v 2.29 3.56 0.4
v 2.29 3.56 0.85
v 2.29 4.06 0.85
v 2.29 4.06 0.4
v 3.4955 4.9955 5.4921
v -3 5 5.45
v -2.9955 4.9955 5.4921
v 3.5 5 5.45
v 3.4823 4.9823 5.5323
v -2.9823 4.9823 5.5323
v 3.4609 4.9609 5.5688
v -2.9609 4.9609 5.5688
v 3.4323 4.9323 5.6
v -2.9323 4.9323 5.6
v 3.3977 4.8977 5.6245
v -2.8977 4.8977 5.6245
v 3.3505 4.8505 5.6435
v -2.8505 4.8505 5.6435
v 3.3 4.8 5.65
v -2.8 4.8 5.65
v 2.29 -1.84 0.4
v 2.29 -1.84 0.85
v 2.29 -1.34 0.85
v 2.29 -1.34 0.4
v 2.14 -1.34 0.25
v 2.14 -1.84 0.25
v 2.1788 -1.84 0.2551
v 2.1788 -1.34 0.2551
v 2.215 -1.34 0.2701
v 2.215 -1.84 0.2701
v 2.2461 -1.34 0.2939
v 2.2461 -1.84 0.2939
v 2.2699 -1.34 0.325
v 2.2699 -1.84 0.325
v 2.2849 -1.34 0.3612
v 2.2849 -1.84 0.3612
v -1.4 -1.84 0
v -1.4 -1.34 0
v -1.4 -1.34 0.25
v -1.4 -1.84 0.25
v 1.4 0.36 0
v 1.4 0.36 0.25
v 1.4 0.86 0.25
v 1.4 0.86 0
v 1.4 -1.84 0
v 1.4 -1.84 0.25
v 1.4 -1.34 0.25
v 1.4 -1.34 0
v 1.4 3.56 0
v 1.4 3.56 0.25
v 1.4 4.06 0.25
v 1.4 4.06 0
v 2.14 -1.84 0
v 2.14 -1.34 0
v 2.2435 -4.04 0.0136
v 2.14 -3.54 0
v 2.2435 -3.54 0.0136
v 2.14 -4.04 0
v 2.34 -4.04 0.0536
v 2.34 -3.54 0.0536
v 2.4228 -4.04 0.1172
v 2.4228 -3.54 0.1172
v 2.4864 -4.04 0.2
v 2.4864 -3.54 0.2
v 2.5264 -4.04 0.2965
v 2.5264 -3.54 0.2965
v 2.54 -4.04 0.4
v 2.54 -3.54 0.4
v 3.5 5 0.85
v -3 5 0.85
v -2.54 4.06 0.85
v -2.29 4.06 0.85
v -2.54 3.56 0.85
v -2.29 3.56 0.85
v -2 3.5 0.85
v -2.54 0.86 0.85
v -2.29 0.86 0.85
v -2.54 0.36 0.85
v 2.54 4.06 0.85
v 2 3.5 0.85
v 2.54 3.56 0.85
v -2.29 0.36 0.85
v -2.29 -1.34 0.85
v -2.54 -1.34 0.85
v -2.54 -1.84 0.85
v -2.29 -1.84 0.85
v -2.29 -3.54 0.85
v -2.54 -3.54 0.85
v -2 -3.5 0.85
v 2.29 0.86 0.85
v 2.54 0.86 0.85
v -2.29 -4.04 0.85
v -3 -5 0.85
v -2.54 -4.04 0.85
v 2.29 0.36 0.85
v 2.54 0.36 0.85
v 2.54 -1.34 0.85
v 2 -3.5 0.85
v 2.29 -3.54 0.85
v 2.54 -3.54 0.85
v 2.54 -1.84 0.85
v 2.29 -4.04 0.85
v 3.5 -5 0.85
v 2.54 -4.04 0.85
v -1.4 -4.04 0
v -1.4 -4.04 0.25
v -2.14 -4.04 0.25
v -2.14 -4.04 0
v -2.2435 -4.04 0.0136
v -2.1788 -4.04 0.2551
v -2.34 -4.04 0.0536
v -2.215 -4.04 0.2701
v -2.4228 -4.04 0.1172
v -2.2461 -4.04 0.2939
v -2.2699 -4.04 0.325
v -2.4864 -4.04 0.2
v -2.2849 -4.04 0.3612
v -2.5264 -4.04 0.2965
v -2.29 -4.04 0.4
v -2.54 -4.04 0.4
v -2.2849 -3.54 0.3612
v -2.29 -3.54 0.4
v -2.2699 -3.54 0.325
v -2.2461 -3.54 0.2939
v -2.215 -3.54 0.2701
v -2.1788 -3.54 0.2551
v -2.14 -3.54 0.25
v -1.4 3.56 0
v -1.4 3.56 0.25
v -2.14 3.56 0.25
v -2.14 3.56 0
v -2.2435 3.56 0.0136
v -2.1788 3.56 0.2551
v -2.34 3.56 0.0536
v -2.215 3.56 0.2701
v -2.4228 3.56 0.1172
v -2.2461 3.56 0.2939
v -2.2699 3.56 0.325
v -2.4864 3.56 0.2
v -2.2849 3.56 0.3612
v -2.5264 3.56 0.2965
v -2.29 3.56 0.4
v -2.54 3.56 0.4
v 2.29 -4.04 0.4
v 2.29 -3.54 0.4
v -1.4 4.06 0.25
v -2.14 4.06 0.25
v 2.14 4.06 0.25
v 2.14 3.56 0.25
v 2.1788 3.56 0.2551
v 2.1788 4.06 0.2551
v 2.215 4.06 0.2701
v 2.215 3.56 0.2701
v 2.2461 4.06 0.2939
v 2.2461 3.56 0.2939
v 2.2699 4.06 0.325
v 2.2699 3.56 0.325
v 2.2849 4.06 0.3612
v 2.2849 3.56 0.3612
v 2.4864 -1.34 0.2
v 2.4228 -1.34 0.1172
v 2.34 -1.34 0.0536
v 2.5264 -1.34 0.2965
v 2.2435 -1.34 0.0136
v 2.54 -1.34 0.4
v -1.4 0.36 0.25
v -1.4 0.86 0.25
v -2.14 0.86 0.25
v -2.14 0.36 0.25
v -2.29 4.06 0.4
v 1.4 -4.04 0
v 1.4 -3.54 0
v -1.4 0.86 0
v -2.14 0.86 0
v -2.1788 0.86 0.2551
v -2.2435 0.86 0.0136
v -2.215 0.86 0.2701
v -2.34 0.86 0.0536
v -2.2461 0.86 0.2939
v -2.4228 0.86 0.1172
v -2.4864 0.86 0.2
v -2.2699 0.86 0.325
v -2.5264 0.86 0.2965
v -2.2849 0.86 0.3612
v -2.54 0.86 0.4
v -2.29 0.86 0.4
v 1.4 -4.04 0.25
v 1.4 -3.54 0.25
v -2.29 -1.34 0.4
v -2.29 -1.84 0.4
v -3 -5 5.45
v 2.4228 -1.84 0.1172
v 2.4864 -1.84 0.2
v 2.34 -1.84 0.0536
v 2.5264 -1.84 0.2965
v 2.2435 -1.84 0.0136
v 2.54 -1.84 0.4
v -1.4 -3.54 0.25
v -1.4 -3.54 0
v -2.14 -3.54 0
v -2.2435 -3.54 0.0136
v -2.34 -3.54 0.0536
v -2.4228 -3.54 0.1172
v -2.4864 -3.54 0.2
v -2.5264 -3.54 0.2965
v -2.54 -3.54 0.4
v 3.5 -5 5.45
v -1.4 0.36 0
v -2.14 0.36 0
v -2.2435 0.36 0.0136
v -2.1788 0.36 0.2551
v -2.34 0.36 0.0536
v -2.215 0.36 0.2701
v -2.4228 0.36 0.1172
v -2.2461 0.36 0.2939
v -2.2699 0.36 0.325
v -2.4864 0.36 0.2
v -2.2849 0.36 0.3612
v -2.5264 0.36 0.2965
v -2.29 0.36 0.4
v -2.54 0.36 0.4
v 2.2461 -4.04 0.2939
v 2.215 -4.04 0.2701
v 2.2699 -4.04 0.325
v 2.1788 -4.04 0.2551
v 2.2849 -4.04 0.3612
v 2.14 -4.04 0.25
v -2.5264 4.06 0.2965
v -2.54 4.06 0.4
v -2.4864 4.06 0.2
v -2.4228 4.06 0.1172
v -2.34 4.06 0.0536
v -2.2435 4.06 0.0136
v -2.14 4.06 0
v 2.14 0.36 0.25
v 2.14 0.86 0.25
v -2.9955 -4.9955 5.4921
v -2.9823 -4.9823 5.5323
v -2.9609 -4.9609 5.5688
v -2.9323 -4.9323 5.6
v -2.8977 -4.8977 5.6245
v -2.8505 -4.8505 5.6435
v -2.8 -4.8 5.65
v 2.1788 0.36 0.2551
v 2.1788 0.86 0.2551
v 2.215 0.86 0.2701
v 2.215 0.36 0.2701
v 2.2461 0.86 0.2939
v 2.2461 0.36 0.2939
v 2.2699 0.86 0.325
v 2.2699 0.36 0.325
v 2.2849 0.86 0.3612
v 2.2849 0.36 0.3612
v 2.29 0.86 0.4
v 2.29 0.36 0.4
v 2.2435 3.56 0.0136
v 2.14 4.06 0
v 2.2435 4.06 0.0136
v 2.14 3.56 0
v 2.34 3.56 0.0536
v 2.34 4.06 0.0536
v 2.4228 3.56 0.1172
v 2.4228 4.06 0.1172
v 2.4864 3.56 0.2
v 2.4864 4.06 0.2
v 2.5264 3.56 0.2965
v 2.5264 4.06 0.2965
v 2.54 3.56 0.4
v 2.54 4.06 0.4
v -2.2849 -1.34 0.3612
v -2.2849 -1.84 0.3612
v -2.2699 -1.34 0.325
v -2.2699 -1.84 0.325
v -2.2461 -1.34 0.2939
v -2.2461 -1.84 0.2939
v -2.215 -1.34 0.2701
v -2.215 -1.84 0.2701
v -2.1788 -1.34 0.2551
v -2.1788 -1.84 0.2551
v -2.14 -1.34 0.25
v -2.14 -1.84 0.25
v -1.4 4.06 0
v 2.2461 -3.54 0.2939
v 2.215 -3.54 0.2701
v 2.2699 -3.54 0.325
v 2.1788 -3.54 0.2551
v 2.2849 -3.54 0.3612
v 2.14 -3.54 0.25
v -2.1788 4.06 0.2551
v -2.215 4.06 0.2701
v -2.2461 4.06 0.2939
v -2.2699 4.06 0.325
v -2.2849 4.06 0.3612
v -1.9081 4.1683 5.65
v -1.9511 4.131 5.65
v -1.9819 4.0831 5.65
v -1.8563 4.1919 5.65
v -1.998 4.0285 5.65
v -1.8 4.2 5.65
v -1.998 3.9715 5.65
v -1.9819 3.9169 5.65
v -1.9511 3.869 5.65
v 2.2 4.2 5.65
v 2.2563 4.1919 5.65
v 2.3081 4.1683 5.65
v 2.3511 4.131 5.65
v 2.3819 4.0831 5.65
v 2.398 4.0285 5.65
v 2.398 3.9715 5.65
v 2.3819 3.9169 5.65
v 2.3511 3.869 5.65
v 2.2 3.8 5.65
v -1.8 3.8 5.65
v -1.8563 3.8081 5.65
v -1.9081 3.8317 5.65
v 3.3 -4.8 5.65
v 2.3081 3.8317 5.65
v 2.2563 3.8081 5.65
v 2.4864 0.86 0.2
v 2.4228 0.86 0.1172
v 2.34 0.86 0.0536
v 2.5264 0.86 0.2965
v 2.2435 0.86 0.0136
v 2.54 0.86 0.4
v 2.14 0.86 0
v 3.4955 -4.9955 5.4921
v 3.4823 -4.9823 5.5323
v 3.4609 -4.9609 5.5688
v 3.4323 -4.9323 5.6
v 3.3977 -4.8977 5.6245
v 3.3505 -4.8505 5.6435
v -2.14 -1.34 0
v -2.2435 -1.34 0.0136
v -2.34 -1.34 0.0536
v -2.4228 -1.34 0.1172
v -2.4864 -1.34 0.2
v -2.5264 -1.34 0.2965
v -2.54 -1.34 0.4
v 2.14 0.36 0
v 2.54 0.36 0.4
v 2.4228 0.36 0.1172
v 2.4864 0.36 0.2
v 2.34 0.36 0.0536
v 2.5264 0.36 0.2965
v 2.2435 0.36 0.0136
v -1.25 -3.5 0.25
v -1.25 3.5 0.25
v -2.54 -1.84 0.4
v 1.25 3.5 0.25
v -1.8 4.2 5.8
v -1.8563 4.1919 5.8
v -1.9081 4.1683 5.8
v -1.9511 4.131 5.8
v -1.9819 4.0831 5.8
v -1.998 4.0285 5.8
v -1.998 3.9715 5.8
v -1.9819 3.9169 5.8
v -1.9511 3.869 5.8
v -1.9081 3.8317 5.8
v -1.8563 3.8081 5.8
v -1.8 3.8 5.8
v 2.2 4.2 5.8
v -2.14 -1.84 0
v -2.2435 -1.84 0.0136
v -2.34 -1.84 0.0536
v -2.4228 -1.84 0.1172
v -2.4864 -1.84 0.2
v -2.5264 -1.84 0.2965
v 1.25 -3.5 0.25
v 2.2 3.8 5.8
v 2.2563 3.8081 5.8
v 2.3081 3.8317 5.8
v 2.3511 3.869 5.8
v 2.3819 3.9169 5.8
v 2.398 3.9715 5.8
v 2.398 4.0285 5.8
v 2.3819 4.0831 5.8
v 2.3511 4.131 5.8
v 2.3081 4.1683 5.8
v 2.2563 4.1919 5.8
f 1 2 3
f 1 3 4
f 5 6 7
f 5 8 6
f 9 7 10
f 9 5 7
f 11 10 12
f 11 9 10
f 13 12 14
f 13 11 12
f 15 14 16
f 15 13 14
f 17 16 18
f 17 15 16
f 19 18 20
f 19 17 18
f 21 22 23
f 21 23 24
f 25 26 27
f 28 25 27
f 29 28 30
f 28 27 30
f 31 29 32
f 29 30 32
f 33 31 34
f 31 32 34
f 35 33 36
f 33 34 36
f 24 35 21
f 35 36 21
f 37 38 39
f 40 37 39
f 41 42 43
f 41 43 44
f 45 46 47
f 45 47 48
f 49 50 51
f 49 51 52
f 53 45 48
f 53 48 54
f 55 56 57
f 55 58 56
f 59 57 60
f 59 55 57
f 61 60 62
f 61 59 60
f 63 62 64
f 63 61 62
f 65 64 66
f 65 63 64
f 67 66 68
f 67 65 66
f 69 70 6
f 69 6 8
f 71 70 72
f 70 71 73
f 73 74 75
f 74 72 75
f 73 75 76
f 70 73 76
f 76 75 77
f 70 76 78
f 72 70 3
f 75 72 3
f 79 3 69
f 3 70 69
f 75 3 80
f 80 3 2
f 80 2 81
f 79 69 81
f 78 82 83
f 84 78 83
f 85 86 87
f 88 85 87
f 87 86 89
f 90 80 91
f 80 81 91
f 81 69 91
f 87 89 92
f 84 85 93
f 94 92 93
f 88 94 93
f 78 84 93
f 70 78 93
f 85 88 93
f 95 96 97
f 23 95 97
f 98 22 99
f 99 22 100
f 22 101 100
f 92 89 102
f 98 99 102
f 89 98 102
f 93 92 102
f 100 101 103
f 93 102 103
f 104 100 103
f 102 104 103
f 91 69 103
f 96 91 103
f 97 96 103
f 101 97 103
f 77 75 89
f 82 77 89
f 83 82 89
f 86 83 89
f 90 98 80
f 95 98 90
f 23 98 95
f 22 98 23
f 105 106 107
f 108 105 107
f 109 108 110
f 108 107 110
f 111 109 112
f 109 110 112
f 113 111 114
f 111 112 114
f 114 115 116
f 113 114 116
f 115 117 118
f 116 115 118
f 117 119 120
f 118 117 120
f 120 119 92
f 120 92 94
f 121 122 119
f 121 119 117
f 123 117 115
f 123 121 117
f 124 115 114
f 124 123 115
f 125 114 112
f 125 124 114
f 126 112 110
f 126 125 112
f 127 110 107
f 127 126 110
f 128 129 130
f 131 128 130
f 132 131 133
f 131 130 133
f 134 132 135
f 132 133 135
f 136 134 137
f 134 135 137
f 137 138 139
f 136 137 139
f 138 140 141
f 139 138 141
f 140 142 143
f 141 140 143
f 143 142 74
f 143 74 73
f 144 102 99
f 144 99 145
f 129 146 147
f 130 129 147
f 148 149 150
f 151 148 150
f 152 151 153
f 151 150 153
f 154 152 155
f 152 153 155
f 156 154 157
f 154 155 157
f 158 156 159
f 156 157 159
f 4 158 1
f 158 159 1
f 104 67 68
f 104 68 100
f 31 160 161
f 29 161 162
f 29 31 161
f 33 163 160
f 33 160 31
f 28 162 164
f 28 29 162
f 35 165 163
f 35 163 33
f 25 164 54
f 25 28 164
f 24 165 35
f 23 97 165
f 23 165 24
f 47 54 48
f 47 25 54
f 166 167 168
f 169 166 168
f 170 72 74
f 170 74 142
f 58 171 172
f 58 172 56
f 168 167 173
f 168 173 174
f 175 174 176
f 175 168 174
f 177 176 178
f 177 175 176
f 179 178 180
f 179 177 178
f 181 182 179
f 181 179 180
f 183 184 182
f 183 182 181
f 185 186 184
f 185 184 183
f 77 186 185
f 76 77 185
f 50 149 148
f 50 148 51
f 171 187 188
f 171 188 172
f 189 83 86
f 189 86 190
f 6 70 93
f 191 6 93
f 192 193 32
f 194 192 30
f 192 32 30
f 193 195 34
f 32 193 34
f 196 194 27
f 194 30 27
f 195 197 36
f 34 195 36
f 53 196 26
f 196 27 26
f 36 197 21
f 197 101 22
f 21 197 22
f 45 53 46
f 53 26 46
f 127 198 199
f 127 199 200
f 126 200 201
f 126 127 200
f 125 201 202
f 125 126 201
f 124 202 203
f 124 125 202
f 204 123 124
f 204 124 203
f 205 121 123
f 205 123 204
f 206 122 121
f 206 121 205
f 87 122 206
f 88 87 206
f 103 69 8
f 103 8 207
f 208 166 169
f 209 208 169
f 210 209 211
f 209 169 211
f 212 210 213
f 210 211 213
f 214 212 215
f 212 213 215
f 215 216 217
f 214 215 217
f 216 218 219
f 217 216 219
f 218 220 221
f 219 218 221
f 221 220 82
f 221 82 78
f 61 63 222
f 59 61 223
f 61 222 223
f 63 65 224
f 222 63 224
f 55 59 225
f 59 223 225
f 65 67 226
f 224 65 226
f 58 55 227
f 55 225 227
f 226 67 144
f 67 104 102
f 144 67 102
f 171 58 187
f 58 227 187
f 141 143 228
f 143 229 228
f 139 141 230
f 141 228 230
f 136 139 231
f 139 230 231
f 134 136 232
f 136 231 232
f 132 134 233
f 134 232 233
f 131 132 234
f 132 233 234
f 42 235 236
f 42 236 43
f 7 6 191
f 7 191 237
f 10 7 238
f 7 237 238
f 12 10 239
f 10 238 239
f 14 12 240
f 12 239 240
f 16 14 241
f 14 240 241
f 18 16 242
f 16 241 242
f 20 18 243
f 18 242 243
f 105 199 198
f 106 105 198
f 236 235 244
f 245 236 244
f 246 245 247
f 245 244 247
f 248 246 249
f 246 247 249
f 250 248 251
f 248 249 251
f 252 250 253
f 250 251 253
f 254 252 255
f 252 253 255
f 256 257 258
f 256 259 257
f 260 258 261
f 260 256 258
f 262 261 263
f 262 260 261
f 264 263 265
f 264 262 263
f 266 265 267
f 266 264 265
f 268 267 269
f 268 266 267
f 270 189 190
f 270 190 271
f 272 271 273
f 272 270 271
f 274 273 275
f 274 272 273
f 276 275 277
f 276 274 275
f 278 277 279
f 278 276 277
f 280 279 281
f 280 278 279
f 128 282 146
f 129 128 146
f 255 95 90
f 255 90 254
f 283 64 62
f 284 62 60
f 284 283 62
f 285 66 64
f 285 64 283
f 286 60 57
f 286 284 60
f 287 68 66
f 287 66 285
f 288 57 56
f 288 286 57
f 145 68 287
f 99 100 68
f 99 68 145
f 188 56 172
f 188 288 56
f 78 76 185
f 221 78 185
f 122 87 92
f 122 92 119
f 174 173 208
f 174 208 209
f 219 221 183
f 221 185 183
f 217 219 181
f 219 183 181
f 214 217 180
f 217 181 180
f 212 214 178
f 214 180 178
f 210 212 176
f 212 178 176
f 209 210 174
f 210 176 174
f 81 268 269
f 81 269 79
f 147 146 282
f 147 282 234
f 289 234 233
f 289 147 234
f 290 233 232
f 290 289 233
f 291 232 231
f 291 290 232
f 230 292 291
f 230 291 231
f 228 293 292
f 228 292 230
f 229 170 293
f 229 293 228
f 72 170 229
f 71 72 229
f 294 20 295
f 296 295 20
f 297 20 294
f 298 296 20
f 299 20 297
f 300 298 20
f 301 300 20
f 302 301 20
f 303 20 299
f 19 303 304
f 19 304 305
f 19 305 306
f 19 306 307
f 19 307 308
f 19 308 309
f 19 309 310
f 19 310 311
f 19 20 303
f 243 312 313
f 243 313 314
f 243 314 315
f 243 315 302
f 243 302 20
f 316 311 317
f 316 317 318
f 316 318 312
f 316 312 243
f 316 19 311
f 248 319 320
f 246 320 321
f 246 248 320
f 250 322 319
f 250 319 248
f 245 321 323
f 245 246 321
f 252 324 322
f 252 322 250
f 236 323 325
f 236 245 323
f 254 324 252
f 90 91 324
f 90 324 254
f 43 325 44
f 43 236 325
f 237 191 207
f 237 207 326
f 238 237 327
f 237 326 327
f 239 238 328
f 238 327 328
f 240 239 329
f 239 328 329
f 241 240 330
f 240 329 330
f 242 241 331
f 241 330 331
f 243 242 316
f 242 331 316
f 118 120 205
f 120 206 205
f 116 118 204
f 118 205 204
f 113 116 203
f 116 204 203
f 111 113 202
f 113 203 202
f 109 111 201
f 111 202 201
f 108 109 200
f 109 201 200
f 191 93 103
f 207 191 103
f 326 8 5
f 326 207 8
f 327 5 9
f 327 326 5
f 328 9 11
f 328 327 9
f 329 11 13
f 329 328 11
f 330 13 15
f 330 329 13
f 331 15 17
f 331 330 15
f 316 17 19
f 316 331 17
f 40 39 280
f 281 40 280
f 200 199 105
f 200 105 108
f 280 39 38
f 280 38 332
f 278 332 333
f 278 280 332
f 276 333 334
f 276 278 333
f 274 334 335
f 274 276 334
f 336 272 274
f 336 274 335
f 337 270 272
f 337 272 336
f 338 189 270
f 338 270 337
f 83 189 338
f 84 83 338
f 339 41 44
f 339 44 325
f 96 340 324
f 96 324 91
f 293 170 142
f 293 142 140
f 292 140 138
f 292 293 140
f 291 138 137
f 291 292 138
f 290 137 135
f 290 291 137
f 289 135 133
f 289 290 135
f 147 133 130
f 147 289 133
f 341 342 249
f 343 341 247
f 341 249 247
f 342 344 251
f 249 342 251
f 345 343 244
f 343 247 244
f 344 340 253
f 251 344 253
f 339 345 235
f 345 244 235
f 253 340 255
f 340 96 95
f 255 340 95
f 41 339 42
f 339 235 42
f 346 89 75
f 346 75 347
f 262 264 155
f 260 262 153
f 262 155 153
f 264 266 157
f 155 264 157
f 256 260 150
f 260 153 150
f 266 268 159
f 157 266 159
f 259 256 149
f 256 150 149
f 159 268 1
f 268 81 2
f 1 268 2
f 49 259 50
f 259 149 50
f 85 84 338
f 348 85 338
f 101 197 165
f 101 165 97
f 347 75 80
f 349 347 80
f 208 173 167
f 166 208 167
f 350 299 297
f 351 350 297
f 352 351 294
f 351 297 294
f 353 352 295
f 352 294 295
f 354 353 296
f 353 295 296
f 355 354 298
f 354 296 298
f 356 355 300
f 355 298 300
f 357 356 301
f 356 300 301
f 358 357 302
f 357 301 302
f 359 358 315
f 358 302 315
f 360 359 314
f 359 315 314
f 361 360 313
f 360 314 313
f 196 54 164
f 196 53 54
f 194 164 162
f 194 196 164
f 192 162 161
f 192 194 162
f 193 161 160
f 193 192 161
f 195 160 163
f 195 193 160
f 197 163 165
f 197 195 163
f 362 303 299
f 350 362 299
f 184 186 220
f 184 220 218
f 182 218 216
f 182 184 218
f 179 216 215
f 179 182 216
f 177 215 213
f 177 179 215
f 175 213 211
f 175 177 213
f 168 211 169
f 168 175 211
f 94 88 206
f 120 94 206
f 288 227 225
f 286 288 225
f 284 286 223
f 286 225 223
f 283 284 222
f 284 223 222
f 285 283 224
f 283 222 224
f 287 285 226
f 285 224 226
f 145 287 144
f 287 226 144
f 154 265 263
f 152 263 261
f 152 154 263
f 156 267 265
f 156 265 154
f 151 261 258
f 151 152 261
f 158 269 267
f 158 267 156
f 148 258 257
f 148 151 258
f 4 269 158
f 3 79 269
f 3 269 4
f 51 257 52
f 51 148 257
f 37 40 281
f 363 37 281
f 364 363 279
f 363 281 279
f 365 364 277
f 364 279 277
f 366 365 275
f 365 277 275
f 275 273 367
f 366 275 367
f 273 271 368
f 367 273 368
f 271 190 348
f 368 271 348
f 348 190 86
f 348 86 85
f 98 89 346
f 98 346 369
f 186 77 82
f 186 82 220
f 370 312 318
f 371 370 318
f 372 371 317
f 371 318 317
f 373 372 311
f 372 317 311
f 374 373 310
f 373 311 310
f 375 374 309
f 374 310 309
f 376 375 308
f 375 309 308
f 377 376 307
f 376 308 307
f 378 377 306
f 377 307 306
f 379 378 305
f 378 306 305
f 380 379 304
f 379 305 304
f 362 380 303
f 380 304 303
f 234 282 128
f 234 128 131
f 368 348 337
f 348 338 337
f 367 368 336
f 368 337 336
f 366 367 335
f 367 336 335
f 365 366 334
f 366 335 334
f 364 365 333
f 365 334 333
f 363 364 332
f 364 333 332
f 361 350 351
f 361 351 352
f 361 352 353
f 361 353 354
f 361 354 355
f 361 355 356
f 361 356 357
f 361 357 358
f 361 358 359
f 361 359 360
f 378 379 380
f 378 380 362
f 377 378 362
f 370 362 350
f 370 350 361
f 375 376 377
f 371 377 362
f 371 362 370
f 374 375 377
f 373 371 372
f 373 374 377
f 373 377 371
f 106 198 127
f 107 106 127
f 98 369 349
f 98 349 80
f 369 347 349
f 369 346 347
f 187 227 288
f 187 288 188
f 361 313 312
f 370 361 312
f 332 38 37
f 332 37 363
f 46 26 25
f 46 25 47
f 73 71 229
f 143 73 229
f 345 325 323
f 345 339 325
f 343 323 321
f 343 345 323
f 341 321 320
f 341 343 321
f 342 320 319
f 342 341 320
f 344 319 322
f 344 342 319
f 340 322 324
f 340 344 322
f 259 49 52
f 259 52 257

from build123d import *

# Parameters (mm, degrees)
PAD010_DEPTH = 0.25
PAD012_DEPTH = 0.25
PAD007_DEPTH = 3.5
PAD013_DEPTH = 0.25
PAD011_DEPTH = 0.25
PAD014_DEPTH = 0.2
SKETCH_W     = 10
SKETCH_H     = 6.5
PAD_DEPTH    = 4.8
FILLET_R     = 0.2


with BuildPart() as pad010:
    # Sketch011 → Pad010 (new body, symmetric)
    with BuildSketch(Plane.XZ.offset(1.59)):
        with BuildLine():
            Line((-2.54, 1.8), (-2.29, 1.8))
            Line((-2.29, 1.8), (-2.29, 0.4))
            ThreePointArc((-2.29, 0.4), (-2.246066, 0.293934), (-2.14, 0.25))
            Line((-1.4, 0.25), (-2.14, 0.25))
            Line((-1.4, 0), (-1.4, 0.25))
            Line((-1.4, 0), (-2.14, 0))
            ThreePointArc((-2.54, 0.4), (-2.422843, 0.117157), (-2.14, 0))
            Line((-2.54, 1.8), (-2.54, 0.4))
        make_face()
        with BuildLine():
            ThreePointArc((2.14, 0.25), (2.246066, 0.293934), (2.29, 0.4))
            Line((2.29, 1.8), (2.29, 0.4))
            Line((2.54, 1.8), (2.29, 1.8))
            Line((2.54, 0.4), (2.54, 1.8))
            ThreePointArc((2.139994, 0), (2.42284, 0.117155), (2.54, 0.4))
            Line((1.4, 0), (2.139994, 0))
            Line((1.4, 0.25), (1.4, 0))
            Line((2.14, 0.25), (1.4, 0.25))
        make_face()
    extrude(amount=PAD010_DEPTH, both=True)


with BuildPart() as pad012:
    # Sketch013 → Pad012 (new body, symmetric)
    with BuildSketch(Plane.XZ.offset(3.79)):
        with BuildLine():
            Line((-2.54, 1.8), (-2.29, 1.8))
            Line((-2.29, 1.8), (-2.29, 0.4))
            ThreePointArc((-2.29, 0.4), (-2.246066, 0.293934), (-2.14, 0.25))
            Line((-1.4, 0.25), (-2.14, 0.25))
            Line((-1.4, 0), (-1.4, 0.25))
            Line((-1.4, 0), (-2.14, 0))
            ThreePointArc((-2.54, 0.4), (-2.422843, 0.117157), (-2.14, 0))
            Line((-2.54, 1.8), (-2.54, 0.4))
        make_face()
        with BuildLine():
            ThreePointArc((2.14, 0.25), (2.246066, 0.293934), (2.29, 0.4))
            Line((2.29, 1.8), (2.29, 0.4))
            Line((2.54, 1.8), (2.29, 1.8))
            Line((2.54, 0.4), (2.54, 1.8))
            ThreePointArc((2.139994, 0), (2.42284, 0.117155), (2.54, 0.4))
            Line((1.4, 0), (2.139994, 0))
            Line((1.4, 0.25), (1.4, 0))
            Line((2.14, 0.25), (1.4, 0.25))
        make_face()
    extrude(amount=PAD012_DEPTH, both=True)


with BuildPart() as pad007:
    # Sketch009 → Pad007 (new body, symmetric)
    with BuildSketch(Plane.XZ):
        Polygon((-1.25, 0.25), (1.25, 0.25), (2.25, 1.05), (-2.25, 1.05), align=None)
    extrude(amount=PAD007_DEPTH, both=True)


with BuildPart() as pad013:
    # Sketch014 → Pad013 (new body, symmetric)
    with BuildSketch(Plane.XZ.offset(-0.61)):
        with BuildLine():
            Line((-2.54, 1.8), (-2.29, 1.8))
            Line((-2.29, 1.8), (-2.29, 0.4))
            ThreePointArc((-2.29, 0.4), (-2.246066, 0.293934), (-2.14, 0.25))
            Line((-1.4, 0.25), (-2.14, 0.25))
            Line((-1.4, 0), (-1.4, 0.25))
            Line((-1.4, 0), (-2.14, 0))
            ThreePointArc((-2.54, 0.4), (-2.422843, 0.117157), (-2.14, 0))
            Line((-2.54, 1.8), (-2.54, 0.4))
        make_face()
        with BuildLine():
            ThreePointArc((2.14, 0.25), (2.246066, 0.293934), (2.29, 0.4))
            Line((2.29, 1.8), (2.29, 0.4))
            Line((2.54, 1.8), (2.29, 1.8))
            Line((2.54, 0.4), (2.54, 1.8))
            ThreePointArc((2.139994, 0), (2.42284, 0.117155), (2.54, 0.4))
            Line((1.4, 0), (2.139994, 0))
            Line((1.4, 0.25), (1.4, 0))
            Line((2.14, 0.25), (1.4, 0.25))
        make_face()
    extrude(amount=PAD013_DEPTH, both=True)


with BuildPart() as pad011:
    # Sketch012 → Pad011 (new body, symmetric)
    with BuildSketch(Plane.XZ.offset(-3.81)):
        with BuildLine():
            Line((-2.54, 1.8), (-2.29, 1.8))
            Line((-2.29, 1.8), (-2.29, 0.4))
            ThreePointArc((-2.29, 0.4), (-2.246066, 0.293934), (-2.14, 0.25))
            Line((-1.4, 0.25), (-2.14, 0.25))
            Line((-1.4, 0), (-1.4, 0.25))
            Line((-1.4, 0), (-2.14, 0))
            ThreePointArc((-2.54, 0.4), (-2.422843, 0.117157), (-2.14, 0))
            Line((-2.54, 1.8), (-2.54, 0.4))
        make_face()
        with BuildLine():
            ThreePointArc((2.14, 0.25), (2.246066, 0.293934), (2.29, 0.4))
            Line((2.29, 1.8), (2.29, 0.4))
            Line((2.54, 1.8), (2.29, 1.8))
            Line((2.54, 0.4), (2.54, 1.8))
            ThreePointArc((2.139994, 0), (2.42284, 0.117155), (2.54, 0.4))
            Line((1.4, 0), (2.139994, 0))
            Line((1.4, 0.25), (1.4, 0))
            Line((2.14, 0.25), (1.4, 0.25))
        make_face()
    extrude(amount=PAD011_DEPTH, both=True)


with BuildPart() as pad014:
    # Sketch001 → Pad014 (new body)
    with BuildSketch(Plane(origin=(0, 0, 5.6), x_dir=(0, -1, 0), z_dir=(0, 0, 1))):
        with BuildLine():
            Line((-3.8, -1.8), (-3.8, 2.2))
            ThreePointArc((-3.8, 2.2), (-4, 2.4), (-4.2, 2.2))
            Line((-4.2, 2.2), (-4.2, -1.8))
            ThreePointArc((-4.2, -1.8), (-4, -2), (-3.8, -1.8))
        make_face()
    extrude(amount=PAD014_DEPTH)


with BuildPart() as relay_dpdt_axicom_imseries_jleg:
    # Sketch → Pad (new body)
    with BuildSketch(Plane(origin=(0, 0, 0.85), x_dir=(0, -1, 0), z_dir=(0, 0, 1))):
        with Locations((0, 0.25)):
            Rectangle(SKETCH_W, SKETCH_H)
    extrude(amount=PAD_DEPTH)

    # Fillet
    fillet_edges = [relay_dpdt_axicom_imseries_jleg.edges().sort_by_distance(p)[0] for p in [
        (-3, 0, 5.65),
        (0.25, -5, 5.65),
        (3.5, 0, 5.65),
        (0.25, 5, 5.65),
    ]]
    fillet(fillet_edges, radius=FILLET_R)

    # Pad008_mp_cp: union Pad010, Pad012, Pad007, Pad013, Pad011, Pad014
    add(pad010.part)
    add(pad012.part)
    add(pad007.part)
    add(pad013.part)
    add(pad011.part)
    add(pad014.part)


solid = relay_dpdt_axicom_imseries_jleg.part
